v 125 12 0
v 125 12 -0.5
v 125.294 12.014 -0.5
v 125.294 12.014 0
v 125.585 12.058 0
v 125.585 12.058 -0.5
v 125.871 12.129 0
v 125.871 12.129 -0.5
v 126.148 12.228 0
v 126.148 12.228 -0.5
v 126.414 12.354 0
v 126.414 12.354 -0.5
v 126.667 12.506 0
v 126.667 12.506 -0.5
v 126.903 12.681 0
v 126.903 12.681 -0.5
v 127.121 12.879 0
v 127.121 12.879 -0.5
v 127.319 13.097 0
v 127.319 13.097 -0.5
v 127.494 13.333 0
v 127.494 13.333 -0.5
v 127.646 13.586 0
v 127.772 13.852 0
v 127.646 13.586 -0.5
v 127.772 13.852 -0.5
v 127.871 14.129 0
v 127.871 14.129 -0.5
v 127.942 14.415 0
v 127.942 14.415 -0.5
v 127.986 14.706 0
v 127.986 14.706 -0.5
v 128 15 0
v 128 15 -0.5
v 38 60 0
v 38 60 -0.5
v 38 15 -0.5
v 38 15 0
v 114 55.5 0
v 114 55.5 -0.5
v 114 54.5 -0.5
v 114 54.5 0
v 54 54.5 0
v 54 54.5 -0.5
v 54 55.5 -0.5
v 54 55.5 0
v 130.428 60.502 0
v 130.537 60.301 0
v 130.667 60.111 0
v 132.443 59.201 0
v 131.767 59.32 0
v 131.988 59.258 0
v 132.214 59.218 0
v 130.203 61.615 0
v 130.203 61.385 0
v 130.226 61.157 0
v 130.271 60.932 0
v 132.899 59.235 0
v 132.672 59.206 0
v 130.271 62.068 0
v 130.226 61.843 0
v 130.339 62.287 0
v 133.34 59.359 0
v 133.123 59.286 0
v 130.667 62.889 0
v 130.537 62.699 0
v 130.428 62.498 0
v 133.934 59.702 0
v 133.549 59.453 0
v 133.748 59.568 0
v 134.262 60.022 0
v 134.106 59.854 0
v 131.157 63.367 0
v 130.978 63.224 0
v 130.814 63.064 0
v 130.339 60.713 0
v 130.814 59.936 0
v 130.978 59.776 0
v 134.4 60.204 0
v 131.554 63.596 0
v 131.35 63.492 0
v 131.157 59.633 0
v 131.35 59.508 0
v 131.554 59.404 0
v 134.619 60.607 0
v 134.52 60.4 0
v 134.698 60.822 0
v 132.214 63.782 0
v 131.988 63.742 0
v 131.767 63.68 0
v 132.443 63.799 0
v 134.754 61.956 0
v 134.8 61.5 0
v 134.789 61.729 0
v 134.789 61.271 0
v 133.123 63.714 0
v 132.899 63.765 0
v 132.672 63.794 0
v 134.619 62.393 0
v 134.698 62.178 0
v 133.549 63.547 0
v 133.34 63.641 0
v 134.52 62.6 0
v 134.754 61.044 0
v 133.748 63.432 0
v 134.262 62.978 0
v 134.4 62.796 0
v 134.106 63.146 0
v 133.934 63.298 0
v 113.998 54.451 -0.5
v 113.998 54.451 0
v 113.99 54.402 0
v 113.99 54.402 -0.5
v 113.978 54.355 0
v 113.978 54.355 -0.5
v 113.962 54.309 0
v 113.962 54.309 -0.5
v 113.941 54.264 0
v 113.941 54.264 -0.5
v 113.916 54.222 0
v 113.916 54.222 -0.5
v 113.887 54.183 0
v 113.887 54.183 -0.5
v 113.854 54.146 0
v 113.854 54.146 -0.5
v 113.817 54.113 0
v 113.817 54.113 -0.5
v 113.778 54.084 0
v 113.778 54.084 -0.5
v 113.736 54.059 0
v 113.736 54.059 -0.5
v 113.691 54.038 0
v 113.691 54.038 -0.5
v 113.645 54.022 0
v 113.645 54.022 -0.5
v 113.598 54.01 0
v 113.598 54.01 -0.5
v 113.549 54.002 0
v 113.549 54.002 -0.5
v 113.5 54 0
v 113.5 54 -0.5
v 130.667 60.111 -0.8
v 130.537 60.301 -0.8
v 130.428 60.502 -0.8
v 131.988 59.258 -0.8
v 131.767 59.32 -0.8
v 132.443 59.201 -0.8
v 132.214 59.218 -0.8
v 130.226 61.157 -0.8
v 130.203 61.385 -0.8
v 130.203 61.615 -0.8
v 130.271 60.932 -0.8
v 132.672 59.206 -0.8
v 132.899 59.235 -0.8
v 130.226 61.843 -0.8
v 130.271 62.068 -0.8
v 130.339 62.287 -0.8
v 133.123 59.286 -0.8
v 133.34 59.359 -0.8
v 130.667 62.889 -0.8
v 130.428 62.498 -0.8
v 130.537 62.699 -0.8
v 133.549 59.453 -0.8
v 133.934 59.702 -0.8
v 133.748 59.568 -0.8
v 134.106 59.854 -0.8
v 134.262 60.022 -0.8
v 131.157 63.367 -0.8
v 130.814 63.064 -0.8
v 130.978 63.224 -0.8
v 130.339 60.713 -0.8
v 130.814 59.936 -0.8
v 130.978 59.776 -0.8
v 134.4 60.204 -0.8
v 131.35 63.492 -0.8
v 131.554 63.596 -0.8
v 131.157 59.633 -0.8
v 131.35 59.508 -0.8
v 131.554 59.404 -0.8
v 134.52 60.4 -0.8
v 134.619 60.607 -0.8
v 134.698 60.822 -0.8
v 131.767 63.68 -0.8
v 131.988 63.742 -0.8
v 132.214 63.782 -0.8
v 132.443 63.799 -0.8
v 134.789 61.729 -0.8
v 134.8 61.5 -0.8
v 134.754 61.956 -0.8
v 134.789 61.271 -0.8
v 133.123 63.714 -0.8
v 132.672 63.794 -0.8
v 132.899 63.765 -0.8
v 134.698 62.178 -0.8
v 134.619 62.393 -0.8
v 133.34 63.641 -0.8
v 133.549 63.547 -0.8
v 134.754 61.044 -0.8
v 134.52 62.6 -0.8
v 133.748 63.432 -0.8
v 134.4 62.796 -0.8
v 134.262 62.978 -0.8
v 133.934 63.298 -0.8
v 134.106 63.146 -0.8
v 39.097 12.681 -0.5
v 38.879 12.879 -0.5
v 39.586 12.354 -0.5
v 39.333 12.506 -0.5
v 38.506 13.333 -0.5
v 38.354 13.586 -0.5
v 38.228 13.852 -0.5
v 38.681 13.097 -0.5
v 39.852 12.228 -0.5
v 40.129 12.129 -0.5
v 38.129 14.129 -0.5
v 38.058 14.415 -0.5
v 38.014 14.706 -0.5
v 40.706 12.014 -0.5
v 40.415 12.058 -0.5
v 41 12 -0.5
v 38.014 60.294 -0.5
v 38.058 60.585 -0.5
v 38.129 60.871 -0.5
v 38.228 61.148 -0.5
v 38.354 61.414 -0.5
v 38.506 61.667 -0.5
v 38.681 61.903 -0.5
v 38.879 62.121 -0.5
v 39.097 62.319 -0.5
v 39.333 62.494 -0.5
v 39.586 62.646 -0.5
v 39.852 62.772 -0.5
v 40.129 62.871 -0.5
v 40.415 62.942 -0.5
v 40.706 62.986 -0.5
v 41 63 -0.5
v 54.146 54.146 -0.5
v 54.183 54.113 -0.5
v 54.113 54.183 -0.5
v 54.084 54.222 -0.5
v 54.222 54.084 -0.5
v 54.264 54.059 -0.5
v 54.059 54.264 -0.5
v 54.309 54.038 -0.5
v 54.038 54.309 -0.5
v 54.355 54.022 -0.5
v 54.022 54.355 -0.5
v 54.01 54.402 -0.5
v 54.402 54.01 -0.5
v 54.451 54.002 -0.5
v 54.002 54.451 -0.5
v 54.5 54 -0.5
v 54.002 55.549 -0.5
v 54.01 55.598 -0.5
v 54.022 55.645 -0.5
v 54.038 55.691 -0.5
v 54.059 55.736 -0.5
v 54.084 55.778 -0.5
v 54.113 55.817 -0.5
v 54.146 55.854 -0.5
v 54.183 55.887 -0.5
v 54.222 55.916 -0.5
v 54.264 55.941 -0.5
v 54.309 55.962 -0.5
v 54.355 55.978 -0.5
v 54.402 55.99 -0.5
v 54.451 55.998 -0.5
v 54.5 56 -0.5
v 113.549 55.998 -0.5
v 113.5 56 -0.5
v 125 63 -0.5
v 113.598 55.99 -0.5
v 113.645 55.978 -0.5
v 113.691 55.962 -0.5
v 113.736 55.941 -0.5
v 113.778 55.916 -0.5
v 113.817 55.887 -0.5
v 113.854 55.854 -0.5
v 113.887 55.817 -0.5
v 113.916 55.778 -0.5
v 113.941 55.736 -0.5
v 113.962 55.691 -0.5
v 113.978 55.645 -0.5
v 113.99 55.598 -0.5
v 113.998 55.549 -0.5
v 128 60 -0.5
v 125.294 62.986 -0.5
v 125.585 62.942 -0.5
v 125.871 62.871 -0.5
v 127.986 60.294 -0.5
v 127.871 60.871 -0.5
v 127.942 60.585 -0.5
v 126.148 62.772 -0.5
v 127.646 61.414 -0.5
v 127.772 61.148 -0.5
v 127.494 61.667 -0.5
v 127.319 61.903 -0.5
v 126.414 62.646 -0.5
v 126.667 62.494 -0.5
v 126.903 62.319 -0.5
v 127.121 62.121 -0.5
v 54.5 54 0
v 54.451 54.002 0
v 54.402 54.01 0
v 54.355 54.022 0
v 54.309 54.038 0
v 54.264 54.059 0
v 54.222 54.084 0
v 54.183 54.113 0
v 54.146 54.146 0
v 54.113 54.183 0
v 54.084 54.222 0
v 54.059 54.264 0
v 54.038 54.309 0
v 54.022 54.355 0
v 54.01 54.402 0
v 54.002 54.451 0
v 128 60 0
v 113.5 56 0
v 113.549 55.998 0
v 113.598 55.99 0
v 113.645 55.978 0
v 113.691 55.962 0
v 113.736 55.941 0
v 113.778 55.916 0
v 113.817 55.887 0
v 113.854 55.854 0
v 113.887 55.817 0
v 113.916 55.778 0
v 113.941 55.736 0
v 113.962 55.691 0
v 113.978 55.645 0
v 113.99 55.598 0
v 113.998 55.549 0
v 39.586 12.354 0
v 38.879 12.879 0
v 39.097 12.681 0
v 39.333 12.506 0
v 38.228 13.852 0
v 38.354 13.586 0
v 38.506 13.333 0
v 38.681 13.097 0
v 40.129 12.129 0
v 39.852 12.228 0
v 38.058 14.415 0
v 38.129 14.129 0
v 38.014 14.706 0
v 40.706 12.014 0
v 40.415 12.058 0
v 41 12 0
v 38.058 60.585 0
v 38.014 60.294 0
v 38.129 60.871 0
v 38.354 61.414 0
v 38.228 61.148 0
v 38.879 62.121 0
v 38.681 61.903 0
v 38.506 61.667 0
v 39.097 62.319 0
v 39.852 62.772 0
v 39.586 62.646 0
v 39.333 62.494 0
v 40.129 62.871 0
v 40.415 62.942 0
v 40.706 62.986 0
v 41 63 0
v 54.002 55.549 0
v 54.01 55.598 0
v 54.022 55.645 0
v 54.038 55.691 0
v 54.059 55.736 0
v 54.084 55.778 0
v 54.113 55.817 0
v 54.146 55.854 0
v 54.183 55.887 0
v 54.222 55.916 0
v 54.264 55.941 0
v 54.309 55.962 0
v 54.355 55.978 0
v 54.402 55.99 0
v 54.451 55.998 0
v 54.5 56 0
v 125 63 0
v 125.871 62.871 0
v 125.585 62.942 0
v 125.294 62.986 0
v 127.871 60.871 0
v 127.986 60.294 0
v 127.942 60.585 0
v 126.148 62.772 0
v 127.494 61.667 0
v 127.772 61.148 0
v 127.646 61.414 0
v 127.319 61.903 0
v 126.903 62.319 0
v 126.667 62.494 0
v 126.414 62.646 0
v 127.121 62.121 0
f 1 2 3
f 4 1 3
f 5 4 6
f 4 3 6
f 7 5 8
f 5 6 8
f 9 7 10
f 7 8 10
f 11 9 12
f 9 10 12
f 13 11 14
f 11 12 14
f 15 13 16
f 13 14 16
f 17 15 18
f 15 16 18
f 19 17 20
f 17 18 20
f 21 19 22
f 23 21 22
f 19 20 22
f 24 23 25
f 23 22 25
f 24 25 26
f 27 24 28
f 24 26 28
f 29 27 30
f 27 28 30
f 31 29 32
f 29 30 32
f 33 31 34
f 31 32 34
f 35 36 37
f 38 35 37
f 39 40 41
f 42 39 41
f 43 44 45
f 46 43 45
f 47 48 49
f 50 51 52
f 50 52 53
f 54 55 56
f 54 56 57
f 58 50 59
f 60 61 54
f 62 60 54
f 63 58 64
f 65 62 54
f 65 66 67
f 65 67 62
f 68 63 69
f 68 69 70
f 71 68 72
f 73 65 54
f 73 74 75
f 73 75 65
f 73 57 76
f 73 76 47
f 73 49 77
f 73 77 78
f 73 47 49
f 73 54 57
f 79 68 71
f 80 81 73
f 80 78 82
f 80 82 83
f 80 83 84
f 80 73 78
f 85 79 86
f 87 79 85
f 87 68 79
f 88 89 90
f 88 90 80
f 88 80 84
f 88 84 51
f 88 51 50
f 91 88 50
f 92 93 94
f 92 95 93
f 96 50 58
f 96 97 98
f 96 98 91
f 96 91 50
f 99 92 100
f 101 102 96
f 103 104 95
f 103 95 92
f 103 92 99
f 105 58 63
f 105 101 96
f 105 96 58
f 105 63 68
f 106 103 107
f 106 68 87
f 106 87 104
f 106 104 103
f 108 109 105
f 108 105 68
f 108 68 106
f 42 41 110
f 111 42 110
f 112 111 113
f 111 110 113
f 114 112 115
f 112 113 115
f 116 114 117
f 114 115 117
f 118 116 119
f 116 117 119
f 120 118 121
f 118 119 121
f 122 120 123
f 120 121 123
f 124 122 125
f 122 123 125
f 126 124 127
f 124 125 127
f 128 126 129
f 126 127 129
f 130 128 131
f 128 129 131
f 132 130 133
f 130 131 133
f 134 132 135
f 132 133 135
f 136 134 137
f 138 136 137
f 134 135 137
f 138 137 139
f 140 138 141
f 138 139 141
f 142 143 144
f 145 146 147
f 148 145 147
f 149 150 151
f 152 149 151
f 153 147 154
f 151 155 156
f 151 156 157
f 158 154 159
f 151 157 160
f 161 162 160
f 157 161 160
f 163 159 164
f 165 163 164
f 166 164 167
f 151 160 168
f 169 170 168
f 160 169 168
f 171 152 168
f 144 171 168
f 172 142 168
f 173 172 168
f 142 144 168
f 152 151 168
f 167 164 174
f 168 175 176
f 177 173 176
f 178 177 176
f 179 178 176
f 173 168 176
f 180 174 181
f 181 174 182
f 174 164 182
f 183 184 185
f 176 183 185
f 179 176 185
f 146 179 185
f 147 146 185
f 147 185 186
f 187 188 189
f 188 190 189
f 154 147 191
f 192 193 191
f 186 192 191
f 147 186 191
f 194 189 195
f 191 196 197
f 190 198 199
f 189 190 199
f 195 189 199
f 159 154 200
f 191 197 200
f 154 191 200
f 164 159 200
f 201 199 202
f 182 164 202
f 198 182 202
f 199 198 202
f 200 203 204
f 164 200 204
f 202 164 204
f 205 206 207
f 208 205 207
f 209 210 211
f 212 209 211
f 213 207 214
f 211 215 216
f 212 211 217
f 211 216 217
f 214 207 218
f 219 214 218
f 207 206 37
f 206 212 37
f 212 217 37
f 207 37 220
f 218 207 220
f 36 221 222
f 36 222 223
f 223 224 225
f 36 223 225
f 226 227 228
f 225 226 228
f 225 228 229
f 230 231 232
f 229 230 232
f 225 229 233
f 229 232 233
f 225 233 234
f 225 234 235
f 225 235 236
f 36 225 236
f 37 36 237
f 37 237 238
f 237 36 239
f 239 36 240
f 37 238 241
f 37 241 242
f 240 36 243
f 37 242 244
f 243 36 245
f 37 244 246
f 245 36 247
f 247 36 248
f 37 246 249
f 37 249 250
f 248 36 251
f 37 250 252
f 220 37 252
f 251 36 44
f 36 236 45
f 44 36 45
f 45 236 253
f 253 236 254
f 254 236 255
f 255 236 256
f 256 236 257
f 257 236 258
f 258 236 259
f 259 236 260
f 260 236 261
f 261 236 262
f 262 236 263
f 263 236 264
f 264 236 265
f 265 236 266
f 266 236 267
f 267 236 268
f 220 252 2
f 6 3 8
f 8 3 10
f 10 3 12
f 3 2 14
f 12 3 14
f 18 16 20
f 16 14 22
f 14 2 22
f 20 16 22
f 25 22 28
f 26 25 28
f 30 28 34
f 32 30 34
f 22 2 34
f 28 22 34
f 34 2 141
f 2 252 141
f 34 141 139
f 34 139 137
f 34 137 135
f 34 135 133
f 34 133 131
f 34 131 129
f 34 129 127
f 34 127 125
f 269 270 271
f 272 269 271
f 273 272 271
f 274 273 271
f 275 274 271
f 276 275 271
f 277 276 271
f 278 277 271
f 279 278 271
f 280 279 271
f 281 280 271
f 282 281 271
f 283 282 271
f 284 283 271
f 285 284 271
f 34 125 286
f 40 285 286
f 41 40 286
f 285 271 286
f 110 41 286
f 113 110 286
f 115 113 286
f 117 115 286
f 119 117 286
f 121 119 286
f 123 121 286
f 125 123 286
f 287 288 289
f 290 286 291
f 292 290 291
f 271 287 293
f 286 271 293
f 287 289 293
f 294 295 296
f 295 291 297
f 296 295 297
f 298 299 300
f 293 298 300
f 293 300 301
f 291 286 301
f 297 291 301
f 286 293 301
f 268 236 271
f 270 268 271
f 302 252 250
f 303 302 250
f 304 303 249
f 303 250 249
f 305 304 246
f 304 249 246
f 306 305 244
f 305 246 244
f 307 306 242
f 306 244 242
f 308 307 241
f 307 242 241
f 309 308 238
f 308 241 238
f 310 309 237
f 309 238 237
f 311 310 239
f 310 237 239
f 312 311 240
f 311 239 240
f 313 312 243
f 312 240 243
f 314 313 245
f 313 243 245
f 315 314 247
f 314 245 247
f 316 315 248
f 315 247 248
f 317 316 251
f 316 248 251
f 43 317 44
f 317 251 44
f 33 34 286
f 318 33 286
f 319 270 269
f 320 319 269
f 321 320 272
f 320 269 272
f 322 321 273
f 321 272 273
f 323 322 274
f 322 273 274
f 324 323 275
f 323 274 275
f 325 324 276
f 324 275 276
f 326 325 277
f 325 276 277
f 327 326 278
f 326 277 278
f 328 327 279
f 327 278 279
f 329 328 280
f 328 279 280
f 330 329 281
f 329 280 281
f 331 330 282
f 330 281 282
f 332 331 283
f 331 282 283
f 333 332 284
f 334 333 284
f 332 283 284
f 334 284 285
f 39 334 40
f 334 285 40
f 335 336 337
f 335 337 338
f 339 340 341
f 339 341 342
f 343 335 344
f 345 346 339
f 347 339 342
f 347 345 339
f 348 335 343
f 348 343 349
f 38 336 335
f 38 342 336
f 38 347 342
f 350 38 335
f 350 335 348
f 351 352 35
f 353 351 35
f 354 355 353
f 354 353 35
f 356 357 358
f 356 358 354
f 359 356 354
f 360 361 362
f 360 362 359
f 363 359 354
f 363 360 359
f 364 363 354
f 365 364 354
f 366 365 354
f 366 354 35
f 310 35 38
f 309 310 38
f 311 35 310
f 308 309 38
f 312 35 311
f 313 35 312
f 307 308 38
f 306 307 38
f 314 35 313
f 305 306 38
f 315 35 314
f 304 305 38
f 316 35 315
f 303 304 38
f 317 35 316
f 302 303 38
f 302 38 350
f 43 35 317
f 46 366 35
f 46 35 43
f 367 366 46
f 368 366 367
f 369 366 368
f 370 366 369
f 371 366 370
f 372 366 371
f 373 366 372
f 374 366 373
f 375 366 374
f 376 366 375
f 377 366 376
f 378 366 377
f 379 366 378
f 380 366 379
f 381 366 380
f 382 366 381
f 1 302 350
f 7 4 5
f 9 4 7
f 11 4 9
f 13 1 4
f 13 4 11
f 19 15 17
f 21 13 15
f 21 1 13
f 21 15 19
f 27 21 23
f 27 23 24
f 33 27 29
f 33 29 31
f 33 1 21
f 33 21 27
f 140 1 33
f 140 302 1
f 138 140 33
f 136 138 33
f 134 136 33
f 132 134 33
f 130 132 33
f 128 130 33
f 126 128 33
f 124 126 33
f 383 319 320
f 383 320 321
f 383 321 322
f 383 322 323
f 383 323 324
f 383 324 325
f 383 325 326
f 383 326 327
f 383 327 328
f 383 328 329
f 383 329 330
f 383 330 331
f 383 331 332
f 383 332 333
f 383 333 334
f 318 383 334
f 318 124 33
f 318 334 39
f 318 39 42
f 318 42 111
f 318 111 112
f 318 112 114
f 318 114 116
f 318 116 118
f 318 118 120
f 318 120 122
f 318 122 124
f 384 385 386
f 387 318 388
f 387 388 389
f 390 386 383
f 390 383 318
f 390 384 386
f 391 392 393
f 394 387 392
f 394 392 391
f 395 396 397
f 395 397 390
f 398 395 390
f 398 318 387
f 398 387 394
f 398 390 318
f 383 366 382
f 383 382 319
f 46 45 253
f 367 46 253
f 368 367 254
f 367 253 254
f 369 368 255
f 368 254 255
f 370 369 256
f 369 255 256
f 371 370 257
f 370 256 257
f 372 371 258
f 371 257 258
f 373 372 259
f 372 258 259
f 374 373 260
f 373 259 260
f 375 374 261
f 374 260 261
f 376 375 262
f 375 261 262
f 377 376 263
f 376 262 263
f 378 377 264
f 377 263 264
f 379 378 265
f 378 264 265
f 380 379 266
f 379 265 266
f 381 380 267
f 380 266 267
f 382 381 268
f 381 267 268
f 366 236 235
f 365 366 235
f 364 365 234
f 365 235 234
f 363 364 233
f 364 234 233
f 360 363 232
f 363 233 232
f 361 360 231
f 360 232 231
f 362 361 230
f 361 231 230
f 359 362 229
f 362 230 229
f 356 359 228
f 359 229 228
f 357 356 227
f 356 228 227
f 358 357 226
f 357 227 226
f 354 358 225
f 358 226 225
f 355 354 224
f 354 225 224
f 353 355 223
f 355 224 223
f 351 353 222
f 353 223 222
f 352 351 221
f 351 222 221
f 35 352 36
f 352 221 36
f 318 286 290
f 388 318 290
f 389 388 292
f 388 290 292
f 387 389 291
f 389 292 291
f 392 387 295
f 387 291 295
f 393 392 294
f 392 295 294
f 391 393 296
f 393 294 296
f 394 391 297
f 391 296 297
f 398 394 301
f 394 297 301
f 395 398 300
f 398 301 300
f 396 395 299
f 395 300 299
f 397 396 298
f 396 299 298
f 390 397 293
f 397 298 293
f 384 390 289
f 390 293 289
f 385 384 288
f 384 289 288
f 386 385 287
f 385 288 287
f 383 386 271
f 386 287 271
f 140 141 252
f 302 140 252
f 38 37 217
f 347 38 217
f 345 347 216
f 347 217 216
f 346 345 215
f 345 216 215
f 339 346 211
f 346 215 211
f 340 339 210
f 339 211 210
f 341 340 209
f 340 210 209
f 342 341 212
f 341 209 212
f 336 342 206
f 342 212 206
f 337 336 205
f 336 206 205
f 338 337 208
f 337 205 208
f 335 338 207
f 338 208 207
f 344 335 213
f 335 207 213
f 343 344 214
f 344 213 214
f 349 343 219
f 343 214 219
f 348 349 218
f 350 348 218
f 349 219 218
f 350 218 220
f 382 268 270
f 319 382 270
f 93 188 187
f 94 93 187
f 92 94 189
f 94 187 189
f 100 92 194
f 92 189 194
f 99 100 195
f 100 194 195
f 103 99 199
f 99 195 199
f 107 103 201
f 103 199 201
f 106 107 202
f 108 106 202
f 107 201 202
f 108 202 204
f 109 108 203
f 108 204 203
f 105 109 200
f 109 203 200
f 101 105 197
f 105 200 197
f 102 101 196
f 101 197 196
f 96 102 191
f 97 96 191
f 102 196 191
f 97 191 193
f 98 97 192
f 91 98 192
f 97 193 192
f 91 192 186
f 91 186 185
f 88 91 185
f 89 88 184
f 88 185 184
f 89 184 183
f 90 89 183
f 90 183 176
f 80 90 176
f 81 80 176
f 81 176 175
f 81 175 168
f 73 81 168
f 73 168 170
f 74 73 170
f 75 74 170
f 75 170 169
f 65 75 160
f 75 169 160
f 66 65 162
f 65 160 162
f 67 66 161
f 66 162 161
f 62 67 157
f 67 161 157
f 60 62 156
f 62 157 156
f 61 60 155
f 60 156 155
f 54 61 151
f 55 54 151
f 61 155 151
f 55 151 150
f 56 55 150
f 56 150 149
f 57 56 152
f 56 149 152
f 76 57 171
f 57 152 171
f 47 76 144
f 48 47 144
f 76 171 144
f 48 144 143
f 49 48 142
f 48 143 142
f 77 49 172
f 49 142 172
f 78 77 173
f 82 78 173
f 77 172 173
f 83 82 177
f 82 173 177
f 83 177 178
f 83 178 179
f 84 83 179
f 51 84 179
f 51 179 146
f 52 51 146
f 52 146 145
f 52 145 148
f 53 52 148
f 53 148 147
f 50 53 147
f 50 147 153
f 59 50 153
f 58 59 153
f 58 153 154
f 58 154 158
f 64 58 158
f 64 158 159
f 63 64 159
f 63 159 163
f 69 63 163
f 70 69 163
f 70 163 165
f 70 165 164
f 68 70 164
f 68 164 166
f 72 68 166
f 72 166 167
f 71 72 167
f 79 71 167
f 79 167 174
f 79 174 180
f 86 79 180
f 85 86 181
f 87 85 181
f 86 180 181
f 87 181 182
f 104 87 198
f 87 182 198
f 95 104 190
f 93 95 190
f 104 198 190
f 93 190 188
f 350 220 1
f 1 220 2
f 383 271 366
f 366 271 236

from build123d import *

# Parameters (mm, degrees)
PRINTER_ACCESS_DOOR_OUTSIDE_CASE_START    = -0.5
PRINTER_ACCESS_DOOR_OUTSIDE_CASE_DEPTH    = 0.5
PRINTER_FEED_BUTTON_START                 = -0.8
SKETCH_2_R                                = 2.3
PRINTER_FEED_BUTTON_DEPTH                 = 0.8
VISIBLE_PAPER_OUTPUT_SLOT_REFERENCE_DEPTH = 1


with BuildPart() as part:
    # 草图1 → Printer_access_door_outside_case (new body)
    with BuildSketch(Plane.XY.offset(PRINTER_ACCESS_DOOR_OUTSIDE_CASE_START)):
        with BuildLine():
            Line((41, 12), (125, 12))
            ThreePointArc((125, 12), (127.121320344, 12.878679656), (128, 15))
            Line((128, 15), (128, 60))
            ThreePointArc((128, 60), (127.121320344, 62.121320344), (125, 63))
            Line((125, 63), (41, 63))
            ThreePointArc((41, 63), (38.878679656, 62.121320344), (38, 60))
            Line((38, 60), (38, 15))
            ThreePointArc((38, 15), (38.878679656, 12.878679656), (41, 12))
        make_face()
    extrude(amount=PRINTER_ACCESS_DOOR_OUTSIDE_CASE_DEPTH)

    # 草图3 → Visible_paper_output_slot_REFERENCE (cut)
    with BuildSketch(Plane(origin=(0, 0, -0.5), x_dir=(-1, 0, 0), z_dir=(0, 0, -1))):
        with BuildLine():
            Line((-113.5, 54), (-54.5, 54))
            ThreePointArc((-54.5, 54), (-54.146446609, 54.146446609), (-54, 54.5))
            Line((-54, 54.5), (-54, 55.5))
            ThreePointArc((-54, 55.5), (-54.146446609, 55.853553391), (-54.5, 56))
            Line((-54.5, 56), (-113.5, 56))
            ThreePointArc((-113.5, 56), (-113.853553391, 55.853553391), (-114, 55.5))
            Line((-114, 55.5), (-114, 54.5))
            ThreePointArc((-114, 54.5), (-113.853553391, 54.146446609), (-113.5, 54))
        make_face()
    extrude(amount=-VISIBLE_PAPER_OUTPUT_SLOT_REFERENCE_DEPTH, mode=Mode.SUBTRACT)


with BuildPart() as body_2:
    # 草图2 → Printer_feed_button (new body)
    with BuildSketch(Plane.XY.offset(PRINTER_FEED_BUTTON_START)):
        with Locations((132.5, 61.5)):
            Circle(SKETCH_2_R)
    extrude(amount=PRINTER_FEED_BUTTON_DEPTH)


solid = Compound([part.part, body_2.part])
